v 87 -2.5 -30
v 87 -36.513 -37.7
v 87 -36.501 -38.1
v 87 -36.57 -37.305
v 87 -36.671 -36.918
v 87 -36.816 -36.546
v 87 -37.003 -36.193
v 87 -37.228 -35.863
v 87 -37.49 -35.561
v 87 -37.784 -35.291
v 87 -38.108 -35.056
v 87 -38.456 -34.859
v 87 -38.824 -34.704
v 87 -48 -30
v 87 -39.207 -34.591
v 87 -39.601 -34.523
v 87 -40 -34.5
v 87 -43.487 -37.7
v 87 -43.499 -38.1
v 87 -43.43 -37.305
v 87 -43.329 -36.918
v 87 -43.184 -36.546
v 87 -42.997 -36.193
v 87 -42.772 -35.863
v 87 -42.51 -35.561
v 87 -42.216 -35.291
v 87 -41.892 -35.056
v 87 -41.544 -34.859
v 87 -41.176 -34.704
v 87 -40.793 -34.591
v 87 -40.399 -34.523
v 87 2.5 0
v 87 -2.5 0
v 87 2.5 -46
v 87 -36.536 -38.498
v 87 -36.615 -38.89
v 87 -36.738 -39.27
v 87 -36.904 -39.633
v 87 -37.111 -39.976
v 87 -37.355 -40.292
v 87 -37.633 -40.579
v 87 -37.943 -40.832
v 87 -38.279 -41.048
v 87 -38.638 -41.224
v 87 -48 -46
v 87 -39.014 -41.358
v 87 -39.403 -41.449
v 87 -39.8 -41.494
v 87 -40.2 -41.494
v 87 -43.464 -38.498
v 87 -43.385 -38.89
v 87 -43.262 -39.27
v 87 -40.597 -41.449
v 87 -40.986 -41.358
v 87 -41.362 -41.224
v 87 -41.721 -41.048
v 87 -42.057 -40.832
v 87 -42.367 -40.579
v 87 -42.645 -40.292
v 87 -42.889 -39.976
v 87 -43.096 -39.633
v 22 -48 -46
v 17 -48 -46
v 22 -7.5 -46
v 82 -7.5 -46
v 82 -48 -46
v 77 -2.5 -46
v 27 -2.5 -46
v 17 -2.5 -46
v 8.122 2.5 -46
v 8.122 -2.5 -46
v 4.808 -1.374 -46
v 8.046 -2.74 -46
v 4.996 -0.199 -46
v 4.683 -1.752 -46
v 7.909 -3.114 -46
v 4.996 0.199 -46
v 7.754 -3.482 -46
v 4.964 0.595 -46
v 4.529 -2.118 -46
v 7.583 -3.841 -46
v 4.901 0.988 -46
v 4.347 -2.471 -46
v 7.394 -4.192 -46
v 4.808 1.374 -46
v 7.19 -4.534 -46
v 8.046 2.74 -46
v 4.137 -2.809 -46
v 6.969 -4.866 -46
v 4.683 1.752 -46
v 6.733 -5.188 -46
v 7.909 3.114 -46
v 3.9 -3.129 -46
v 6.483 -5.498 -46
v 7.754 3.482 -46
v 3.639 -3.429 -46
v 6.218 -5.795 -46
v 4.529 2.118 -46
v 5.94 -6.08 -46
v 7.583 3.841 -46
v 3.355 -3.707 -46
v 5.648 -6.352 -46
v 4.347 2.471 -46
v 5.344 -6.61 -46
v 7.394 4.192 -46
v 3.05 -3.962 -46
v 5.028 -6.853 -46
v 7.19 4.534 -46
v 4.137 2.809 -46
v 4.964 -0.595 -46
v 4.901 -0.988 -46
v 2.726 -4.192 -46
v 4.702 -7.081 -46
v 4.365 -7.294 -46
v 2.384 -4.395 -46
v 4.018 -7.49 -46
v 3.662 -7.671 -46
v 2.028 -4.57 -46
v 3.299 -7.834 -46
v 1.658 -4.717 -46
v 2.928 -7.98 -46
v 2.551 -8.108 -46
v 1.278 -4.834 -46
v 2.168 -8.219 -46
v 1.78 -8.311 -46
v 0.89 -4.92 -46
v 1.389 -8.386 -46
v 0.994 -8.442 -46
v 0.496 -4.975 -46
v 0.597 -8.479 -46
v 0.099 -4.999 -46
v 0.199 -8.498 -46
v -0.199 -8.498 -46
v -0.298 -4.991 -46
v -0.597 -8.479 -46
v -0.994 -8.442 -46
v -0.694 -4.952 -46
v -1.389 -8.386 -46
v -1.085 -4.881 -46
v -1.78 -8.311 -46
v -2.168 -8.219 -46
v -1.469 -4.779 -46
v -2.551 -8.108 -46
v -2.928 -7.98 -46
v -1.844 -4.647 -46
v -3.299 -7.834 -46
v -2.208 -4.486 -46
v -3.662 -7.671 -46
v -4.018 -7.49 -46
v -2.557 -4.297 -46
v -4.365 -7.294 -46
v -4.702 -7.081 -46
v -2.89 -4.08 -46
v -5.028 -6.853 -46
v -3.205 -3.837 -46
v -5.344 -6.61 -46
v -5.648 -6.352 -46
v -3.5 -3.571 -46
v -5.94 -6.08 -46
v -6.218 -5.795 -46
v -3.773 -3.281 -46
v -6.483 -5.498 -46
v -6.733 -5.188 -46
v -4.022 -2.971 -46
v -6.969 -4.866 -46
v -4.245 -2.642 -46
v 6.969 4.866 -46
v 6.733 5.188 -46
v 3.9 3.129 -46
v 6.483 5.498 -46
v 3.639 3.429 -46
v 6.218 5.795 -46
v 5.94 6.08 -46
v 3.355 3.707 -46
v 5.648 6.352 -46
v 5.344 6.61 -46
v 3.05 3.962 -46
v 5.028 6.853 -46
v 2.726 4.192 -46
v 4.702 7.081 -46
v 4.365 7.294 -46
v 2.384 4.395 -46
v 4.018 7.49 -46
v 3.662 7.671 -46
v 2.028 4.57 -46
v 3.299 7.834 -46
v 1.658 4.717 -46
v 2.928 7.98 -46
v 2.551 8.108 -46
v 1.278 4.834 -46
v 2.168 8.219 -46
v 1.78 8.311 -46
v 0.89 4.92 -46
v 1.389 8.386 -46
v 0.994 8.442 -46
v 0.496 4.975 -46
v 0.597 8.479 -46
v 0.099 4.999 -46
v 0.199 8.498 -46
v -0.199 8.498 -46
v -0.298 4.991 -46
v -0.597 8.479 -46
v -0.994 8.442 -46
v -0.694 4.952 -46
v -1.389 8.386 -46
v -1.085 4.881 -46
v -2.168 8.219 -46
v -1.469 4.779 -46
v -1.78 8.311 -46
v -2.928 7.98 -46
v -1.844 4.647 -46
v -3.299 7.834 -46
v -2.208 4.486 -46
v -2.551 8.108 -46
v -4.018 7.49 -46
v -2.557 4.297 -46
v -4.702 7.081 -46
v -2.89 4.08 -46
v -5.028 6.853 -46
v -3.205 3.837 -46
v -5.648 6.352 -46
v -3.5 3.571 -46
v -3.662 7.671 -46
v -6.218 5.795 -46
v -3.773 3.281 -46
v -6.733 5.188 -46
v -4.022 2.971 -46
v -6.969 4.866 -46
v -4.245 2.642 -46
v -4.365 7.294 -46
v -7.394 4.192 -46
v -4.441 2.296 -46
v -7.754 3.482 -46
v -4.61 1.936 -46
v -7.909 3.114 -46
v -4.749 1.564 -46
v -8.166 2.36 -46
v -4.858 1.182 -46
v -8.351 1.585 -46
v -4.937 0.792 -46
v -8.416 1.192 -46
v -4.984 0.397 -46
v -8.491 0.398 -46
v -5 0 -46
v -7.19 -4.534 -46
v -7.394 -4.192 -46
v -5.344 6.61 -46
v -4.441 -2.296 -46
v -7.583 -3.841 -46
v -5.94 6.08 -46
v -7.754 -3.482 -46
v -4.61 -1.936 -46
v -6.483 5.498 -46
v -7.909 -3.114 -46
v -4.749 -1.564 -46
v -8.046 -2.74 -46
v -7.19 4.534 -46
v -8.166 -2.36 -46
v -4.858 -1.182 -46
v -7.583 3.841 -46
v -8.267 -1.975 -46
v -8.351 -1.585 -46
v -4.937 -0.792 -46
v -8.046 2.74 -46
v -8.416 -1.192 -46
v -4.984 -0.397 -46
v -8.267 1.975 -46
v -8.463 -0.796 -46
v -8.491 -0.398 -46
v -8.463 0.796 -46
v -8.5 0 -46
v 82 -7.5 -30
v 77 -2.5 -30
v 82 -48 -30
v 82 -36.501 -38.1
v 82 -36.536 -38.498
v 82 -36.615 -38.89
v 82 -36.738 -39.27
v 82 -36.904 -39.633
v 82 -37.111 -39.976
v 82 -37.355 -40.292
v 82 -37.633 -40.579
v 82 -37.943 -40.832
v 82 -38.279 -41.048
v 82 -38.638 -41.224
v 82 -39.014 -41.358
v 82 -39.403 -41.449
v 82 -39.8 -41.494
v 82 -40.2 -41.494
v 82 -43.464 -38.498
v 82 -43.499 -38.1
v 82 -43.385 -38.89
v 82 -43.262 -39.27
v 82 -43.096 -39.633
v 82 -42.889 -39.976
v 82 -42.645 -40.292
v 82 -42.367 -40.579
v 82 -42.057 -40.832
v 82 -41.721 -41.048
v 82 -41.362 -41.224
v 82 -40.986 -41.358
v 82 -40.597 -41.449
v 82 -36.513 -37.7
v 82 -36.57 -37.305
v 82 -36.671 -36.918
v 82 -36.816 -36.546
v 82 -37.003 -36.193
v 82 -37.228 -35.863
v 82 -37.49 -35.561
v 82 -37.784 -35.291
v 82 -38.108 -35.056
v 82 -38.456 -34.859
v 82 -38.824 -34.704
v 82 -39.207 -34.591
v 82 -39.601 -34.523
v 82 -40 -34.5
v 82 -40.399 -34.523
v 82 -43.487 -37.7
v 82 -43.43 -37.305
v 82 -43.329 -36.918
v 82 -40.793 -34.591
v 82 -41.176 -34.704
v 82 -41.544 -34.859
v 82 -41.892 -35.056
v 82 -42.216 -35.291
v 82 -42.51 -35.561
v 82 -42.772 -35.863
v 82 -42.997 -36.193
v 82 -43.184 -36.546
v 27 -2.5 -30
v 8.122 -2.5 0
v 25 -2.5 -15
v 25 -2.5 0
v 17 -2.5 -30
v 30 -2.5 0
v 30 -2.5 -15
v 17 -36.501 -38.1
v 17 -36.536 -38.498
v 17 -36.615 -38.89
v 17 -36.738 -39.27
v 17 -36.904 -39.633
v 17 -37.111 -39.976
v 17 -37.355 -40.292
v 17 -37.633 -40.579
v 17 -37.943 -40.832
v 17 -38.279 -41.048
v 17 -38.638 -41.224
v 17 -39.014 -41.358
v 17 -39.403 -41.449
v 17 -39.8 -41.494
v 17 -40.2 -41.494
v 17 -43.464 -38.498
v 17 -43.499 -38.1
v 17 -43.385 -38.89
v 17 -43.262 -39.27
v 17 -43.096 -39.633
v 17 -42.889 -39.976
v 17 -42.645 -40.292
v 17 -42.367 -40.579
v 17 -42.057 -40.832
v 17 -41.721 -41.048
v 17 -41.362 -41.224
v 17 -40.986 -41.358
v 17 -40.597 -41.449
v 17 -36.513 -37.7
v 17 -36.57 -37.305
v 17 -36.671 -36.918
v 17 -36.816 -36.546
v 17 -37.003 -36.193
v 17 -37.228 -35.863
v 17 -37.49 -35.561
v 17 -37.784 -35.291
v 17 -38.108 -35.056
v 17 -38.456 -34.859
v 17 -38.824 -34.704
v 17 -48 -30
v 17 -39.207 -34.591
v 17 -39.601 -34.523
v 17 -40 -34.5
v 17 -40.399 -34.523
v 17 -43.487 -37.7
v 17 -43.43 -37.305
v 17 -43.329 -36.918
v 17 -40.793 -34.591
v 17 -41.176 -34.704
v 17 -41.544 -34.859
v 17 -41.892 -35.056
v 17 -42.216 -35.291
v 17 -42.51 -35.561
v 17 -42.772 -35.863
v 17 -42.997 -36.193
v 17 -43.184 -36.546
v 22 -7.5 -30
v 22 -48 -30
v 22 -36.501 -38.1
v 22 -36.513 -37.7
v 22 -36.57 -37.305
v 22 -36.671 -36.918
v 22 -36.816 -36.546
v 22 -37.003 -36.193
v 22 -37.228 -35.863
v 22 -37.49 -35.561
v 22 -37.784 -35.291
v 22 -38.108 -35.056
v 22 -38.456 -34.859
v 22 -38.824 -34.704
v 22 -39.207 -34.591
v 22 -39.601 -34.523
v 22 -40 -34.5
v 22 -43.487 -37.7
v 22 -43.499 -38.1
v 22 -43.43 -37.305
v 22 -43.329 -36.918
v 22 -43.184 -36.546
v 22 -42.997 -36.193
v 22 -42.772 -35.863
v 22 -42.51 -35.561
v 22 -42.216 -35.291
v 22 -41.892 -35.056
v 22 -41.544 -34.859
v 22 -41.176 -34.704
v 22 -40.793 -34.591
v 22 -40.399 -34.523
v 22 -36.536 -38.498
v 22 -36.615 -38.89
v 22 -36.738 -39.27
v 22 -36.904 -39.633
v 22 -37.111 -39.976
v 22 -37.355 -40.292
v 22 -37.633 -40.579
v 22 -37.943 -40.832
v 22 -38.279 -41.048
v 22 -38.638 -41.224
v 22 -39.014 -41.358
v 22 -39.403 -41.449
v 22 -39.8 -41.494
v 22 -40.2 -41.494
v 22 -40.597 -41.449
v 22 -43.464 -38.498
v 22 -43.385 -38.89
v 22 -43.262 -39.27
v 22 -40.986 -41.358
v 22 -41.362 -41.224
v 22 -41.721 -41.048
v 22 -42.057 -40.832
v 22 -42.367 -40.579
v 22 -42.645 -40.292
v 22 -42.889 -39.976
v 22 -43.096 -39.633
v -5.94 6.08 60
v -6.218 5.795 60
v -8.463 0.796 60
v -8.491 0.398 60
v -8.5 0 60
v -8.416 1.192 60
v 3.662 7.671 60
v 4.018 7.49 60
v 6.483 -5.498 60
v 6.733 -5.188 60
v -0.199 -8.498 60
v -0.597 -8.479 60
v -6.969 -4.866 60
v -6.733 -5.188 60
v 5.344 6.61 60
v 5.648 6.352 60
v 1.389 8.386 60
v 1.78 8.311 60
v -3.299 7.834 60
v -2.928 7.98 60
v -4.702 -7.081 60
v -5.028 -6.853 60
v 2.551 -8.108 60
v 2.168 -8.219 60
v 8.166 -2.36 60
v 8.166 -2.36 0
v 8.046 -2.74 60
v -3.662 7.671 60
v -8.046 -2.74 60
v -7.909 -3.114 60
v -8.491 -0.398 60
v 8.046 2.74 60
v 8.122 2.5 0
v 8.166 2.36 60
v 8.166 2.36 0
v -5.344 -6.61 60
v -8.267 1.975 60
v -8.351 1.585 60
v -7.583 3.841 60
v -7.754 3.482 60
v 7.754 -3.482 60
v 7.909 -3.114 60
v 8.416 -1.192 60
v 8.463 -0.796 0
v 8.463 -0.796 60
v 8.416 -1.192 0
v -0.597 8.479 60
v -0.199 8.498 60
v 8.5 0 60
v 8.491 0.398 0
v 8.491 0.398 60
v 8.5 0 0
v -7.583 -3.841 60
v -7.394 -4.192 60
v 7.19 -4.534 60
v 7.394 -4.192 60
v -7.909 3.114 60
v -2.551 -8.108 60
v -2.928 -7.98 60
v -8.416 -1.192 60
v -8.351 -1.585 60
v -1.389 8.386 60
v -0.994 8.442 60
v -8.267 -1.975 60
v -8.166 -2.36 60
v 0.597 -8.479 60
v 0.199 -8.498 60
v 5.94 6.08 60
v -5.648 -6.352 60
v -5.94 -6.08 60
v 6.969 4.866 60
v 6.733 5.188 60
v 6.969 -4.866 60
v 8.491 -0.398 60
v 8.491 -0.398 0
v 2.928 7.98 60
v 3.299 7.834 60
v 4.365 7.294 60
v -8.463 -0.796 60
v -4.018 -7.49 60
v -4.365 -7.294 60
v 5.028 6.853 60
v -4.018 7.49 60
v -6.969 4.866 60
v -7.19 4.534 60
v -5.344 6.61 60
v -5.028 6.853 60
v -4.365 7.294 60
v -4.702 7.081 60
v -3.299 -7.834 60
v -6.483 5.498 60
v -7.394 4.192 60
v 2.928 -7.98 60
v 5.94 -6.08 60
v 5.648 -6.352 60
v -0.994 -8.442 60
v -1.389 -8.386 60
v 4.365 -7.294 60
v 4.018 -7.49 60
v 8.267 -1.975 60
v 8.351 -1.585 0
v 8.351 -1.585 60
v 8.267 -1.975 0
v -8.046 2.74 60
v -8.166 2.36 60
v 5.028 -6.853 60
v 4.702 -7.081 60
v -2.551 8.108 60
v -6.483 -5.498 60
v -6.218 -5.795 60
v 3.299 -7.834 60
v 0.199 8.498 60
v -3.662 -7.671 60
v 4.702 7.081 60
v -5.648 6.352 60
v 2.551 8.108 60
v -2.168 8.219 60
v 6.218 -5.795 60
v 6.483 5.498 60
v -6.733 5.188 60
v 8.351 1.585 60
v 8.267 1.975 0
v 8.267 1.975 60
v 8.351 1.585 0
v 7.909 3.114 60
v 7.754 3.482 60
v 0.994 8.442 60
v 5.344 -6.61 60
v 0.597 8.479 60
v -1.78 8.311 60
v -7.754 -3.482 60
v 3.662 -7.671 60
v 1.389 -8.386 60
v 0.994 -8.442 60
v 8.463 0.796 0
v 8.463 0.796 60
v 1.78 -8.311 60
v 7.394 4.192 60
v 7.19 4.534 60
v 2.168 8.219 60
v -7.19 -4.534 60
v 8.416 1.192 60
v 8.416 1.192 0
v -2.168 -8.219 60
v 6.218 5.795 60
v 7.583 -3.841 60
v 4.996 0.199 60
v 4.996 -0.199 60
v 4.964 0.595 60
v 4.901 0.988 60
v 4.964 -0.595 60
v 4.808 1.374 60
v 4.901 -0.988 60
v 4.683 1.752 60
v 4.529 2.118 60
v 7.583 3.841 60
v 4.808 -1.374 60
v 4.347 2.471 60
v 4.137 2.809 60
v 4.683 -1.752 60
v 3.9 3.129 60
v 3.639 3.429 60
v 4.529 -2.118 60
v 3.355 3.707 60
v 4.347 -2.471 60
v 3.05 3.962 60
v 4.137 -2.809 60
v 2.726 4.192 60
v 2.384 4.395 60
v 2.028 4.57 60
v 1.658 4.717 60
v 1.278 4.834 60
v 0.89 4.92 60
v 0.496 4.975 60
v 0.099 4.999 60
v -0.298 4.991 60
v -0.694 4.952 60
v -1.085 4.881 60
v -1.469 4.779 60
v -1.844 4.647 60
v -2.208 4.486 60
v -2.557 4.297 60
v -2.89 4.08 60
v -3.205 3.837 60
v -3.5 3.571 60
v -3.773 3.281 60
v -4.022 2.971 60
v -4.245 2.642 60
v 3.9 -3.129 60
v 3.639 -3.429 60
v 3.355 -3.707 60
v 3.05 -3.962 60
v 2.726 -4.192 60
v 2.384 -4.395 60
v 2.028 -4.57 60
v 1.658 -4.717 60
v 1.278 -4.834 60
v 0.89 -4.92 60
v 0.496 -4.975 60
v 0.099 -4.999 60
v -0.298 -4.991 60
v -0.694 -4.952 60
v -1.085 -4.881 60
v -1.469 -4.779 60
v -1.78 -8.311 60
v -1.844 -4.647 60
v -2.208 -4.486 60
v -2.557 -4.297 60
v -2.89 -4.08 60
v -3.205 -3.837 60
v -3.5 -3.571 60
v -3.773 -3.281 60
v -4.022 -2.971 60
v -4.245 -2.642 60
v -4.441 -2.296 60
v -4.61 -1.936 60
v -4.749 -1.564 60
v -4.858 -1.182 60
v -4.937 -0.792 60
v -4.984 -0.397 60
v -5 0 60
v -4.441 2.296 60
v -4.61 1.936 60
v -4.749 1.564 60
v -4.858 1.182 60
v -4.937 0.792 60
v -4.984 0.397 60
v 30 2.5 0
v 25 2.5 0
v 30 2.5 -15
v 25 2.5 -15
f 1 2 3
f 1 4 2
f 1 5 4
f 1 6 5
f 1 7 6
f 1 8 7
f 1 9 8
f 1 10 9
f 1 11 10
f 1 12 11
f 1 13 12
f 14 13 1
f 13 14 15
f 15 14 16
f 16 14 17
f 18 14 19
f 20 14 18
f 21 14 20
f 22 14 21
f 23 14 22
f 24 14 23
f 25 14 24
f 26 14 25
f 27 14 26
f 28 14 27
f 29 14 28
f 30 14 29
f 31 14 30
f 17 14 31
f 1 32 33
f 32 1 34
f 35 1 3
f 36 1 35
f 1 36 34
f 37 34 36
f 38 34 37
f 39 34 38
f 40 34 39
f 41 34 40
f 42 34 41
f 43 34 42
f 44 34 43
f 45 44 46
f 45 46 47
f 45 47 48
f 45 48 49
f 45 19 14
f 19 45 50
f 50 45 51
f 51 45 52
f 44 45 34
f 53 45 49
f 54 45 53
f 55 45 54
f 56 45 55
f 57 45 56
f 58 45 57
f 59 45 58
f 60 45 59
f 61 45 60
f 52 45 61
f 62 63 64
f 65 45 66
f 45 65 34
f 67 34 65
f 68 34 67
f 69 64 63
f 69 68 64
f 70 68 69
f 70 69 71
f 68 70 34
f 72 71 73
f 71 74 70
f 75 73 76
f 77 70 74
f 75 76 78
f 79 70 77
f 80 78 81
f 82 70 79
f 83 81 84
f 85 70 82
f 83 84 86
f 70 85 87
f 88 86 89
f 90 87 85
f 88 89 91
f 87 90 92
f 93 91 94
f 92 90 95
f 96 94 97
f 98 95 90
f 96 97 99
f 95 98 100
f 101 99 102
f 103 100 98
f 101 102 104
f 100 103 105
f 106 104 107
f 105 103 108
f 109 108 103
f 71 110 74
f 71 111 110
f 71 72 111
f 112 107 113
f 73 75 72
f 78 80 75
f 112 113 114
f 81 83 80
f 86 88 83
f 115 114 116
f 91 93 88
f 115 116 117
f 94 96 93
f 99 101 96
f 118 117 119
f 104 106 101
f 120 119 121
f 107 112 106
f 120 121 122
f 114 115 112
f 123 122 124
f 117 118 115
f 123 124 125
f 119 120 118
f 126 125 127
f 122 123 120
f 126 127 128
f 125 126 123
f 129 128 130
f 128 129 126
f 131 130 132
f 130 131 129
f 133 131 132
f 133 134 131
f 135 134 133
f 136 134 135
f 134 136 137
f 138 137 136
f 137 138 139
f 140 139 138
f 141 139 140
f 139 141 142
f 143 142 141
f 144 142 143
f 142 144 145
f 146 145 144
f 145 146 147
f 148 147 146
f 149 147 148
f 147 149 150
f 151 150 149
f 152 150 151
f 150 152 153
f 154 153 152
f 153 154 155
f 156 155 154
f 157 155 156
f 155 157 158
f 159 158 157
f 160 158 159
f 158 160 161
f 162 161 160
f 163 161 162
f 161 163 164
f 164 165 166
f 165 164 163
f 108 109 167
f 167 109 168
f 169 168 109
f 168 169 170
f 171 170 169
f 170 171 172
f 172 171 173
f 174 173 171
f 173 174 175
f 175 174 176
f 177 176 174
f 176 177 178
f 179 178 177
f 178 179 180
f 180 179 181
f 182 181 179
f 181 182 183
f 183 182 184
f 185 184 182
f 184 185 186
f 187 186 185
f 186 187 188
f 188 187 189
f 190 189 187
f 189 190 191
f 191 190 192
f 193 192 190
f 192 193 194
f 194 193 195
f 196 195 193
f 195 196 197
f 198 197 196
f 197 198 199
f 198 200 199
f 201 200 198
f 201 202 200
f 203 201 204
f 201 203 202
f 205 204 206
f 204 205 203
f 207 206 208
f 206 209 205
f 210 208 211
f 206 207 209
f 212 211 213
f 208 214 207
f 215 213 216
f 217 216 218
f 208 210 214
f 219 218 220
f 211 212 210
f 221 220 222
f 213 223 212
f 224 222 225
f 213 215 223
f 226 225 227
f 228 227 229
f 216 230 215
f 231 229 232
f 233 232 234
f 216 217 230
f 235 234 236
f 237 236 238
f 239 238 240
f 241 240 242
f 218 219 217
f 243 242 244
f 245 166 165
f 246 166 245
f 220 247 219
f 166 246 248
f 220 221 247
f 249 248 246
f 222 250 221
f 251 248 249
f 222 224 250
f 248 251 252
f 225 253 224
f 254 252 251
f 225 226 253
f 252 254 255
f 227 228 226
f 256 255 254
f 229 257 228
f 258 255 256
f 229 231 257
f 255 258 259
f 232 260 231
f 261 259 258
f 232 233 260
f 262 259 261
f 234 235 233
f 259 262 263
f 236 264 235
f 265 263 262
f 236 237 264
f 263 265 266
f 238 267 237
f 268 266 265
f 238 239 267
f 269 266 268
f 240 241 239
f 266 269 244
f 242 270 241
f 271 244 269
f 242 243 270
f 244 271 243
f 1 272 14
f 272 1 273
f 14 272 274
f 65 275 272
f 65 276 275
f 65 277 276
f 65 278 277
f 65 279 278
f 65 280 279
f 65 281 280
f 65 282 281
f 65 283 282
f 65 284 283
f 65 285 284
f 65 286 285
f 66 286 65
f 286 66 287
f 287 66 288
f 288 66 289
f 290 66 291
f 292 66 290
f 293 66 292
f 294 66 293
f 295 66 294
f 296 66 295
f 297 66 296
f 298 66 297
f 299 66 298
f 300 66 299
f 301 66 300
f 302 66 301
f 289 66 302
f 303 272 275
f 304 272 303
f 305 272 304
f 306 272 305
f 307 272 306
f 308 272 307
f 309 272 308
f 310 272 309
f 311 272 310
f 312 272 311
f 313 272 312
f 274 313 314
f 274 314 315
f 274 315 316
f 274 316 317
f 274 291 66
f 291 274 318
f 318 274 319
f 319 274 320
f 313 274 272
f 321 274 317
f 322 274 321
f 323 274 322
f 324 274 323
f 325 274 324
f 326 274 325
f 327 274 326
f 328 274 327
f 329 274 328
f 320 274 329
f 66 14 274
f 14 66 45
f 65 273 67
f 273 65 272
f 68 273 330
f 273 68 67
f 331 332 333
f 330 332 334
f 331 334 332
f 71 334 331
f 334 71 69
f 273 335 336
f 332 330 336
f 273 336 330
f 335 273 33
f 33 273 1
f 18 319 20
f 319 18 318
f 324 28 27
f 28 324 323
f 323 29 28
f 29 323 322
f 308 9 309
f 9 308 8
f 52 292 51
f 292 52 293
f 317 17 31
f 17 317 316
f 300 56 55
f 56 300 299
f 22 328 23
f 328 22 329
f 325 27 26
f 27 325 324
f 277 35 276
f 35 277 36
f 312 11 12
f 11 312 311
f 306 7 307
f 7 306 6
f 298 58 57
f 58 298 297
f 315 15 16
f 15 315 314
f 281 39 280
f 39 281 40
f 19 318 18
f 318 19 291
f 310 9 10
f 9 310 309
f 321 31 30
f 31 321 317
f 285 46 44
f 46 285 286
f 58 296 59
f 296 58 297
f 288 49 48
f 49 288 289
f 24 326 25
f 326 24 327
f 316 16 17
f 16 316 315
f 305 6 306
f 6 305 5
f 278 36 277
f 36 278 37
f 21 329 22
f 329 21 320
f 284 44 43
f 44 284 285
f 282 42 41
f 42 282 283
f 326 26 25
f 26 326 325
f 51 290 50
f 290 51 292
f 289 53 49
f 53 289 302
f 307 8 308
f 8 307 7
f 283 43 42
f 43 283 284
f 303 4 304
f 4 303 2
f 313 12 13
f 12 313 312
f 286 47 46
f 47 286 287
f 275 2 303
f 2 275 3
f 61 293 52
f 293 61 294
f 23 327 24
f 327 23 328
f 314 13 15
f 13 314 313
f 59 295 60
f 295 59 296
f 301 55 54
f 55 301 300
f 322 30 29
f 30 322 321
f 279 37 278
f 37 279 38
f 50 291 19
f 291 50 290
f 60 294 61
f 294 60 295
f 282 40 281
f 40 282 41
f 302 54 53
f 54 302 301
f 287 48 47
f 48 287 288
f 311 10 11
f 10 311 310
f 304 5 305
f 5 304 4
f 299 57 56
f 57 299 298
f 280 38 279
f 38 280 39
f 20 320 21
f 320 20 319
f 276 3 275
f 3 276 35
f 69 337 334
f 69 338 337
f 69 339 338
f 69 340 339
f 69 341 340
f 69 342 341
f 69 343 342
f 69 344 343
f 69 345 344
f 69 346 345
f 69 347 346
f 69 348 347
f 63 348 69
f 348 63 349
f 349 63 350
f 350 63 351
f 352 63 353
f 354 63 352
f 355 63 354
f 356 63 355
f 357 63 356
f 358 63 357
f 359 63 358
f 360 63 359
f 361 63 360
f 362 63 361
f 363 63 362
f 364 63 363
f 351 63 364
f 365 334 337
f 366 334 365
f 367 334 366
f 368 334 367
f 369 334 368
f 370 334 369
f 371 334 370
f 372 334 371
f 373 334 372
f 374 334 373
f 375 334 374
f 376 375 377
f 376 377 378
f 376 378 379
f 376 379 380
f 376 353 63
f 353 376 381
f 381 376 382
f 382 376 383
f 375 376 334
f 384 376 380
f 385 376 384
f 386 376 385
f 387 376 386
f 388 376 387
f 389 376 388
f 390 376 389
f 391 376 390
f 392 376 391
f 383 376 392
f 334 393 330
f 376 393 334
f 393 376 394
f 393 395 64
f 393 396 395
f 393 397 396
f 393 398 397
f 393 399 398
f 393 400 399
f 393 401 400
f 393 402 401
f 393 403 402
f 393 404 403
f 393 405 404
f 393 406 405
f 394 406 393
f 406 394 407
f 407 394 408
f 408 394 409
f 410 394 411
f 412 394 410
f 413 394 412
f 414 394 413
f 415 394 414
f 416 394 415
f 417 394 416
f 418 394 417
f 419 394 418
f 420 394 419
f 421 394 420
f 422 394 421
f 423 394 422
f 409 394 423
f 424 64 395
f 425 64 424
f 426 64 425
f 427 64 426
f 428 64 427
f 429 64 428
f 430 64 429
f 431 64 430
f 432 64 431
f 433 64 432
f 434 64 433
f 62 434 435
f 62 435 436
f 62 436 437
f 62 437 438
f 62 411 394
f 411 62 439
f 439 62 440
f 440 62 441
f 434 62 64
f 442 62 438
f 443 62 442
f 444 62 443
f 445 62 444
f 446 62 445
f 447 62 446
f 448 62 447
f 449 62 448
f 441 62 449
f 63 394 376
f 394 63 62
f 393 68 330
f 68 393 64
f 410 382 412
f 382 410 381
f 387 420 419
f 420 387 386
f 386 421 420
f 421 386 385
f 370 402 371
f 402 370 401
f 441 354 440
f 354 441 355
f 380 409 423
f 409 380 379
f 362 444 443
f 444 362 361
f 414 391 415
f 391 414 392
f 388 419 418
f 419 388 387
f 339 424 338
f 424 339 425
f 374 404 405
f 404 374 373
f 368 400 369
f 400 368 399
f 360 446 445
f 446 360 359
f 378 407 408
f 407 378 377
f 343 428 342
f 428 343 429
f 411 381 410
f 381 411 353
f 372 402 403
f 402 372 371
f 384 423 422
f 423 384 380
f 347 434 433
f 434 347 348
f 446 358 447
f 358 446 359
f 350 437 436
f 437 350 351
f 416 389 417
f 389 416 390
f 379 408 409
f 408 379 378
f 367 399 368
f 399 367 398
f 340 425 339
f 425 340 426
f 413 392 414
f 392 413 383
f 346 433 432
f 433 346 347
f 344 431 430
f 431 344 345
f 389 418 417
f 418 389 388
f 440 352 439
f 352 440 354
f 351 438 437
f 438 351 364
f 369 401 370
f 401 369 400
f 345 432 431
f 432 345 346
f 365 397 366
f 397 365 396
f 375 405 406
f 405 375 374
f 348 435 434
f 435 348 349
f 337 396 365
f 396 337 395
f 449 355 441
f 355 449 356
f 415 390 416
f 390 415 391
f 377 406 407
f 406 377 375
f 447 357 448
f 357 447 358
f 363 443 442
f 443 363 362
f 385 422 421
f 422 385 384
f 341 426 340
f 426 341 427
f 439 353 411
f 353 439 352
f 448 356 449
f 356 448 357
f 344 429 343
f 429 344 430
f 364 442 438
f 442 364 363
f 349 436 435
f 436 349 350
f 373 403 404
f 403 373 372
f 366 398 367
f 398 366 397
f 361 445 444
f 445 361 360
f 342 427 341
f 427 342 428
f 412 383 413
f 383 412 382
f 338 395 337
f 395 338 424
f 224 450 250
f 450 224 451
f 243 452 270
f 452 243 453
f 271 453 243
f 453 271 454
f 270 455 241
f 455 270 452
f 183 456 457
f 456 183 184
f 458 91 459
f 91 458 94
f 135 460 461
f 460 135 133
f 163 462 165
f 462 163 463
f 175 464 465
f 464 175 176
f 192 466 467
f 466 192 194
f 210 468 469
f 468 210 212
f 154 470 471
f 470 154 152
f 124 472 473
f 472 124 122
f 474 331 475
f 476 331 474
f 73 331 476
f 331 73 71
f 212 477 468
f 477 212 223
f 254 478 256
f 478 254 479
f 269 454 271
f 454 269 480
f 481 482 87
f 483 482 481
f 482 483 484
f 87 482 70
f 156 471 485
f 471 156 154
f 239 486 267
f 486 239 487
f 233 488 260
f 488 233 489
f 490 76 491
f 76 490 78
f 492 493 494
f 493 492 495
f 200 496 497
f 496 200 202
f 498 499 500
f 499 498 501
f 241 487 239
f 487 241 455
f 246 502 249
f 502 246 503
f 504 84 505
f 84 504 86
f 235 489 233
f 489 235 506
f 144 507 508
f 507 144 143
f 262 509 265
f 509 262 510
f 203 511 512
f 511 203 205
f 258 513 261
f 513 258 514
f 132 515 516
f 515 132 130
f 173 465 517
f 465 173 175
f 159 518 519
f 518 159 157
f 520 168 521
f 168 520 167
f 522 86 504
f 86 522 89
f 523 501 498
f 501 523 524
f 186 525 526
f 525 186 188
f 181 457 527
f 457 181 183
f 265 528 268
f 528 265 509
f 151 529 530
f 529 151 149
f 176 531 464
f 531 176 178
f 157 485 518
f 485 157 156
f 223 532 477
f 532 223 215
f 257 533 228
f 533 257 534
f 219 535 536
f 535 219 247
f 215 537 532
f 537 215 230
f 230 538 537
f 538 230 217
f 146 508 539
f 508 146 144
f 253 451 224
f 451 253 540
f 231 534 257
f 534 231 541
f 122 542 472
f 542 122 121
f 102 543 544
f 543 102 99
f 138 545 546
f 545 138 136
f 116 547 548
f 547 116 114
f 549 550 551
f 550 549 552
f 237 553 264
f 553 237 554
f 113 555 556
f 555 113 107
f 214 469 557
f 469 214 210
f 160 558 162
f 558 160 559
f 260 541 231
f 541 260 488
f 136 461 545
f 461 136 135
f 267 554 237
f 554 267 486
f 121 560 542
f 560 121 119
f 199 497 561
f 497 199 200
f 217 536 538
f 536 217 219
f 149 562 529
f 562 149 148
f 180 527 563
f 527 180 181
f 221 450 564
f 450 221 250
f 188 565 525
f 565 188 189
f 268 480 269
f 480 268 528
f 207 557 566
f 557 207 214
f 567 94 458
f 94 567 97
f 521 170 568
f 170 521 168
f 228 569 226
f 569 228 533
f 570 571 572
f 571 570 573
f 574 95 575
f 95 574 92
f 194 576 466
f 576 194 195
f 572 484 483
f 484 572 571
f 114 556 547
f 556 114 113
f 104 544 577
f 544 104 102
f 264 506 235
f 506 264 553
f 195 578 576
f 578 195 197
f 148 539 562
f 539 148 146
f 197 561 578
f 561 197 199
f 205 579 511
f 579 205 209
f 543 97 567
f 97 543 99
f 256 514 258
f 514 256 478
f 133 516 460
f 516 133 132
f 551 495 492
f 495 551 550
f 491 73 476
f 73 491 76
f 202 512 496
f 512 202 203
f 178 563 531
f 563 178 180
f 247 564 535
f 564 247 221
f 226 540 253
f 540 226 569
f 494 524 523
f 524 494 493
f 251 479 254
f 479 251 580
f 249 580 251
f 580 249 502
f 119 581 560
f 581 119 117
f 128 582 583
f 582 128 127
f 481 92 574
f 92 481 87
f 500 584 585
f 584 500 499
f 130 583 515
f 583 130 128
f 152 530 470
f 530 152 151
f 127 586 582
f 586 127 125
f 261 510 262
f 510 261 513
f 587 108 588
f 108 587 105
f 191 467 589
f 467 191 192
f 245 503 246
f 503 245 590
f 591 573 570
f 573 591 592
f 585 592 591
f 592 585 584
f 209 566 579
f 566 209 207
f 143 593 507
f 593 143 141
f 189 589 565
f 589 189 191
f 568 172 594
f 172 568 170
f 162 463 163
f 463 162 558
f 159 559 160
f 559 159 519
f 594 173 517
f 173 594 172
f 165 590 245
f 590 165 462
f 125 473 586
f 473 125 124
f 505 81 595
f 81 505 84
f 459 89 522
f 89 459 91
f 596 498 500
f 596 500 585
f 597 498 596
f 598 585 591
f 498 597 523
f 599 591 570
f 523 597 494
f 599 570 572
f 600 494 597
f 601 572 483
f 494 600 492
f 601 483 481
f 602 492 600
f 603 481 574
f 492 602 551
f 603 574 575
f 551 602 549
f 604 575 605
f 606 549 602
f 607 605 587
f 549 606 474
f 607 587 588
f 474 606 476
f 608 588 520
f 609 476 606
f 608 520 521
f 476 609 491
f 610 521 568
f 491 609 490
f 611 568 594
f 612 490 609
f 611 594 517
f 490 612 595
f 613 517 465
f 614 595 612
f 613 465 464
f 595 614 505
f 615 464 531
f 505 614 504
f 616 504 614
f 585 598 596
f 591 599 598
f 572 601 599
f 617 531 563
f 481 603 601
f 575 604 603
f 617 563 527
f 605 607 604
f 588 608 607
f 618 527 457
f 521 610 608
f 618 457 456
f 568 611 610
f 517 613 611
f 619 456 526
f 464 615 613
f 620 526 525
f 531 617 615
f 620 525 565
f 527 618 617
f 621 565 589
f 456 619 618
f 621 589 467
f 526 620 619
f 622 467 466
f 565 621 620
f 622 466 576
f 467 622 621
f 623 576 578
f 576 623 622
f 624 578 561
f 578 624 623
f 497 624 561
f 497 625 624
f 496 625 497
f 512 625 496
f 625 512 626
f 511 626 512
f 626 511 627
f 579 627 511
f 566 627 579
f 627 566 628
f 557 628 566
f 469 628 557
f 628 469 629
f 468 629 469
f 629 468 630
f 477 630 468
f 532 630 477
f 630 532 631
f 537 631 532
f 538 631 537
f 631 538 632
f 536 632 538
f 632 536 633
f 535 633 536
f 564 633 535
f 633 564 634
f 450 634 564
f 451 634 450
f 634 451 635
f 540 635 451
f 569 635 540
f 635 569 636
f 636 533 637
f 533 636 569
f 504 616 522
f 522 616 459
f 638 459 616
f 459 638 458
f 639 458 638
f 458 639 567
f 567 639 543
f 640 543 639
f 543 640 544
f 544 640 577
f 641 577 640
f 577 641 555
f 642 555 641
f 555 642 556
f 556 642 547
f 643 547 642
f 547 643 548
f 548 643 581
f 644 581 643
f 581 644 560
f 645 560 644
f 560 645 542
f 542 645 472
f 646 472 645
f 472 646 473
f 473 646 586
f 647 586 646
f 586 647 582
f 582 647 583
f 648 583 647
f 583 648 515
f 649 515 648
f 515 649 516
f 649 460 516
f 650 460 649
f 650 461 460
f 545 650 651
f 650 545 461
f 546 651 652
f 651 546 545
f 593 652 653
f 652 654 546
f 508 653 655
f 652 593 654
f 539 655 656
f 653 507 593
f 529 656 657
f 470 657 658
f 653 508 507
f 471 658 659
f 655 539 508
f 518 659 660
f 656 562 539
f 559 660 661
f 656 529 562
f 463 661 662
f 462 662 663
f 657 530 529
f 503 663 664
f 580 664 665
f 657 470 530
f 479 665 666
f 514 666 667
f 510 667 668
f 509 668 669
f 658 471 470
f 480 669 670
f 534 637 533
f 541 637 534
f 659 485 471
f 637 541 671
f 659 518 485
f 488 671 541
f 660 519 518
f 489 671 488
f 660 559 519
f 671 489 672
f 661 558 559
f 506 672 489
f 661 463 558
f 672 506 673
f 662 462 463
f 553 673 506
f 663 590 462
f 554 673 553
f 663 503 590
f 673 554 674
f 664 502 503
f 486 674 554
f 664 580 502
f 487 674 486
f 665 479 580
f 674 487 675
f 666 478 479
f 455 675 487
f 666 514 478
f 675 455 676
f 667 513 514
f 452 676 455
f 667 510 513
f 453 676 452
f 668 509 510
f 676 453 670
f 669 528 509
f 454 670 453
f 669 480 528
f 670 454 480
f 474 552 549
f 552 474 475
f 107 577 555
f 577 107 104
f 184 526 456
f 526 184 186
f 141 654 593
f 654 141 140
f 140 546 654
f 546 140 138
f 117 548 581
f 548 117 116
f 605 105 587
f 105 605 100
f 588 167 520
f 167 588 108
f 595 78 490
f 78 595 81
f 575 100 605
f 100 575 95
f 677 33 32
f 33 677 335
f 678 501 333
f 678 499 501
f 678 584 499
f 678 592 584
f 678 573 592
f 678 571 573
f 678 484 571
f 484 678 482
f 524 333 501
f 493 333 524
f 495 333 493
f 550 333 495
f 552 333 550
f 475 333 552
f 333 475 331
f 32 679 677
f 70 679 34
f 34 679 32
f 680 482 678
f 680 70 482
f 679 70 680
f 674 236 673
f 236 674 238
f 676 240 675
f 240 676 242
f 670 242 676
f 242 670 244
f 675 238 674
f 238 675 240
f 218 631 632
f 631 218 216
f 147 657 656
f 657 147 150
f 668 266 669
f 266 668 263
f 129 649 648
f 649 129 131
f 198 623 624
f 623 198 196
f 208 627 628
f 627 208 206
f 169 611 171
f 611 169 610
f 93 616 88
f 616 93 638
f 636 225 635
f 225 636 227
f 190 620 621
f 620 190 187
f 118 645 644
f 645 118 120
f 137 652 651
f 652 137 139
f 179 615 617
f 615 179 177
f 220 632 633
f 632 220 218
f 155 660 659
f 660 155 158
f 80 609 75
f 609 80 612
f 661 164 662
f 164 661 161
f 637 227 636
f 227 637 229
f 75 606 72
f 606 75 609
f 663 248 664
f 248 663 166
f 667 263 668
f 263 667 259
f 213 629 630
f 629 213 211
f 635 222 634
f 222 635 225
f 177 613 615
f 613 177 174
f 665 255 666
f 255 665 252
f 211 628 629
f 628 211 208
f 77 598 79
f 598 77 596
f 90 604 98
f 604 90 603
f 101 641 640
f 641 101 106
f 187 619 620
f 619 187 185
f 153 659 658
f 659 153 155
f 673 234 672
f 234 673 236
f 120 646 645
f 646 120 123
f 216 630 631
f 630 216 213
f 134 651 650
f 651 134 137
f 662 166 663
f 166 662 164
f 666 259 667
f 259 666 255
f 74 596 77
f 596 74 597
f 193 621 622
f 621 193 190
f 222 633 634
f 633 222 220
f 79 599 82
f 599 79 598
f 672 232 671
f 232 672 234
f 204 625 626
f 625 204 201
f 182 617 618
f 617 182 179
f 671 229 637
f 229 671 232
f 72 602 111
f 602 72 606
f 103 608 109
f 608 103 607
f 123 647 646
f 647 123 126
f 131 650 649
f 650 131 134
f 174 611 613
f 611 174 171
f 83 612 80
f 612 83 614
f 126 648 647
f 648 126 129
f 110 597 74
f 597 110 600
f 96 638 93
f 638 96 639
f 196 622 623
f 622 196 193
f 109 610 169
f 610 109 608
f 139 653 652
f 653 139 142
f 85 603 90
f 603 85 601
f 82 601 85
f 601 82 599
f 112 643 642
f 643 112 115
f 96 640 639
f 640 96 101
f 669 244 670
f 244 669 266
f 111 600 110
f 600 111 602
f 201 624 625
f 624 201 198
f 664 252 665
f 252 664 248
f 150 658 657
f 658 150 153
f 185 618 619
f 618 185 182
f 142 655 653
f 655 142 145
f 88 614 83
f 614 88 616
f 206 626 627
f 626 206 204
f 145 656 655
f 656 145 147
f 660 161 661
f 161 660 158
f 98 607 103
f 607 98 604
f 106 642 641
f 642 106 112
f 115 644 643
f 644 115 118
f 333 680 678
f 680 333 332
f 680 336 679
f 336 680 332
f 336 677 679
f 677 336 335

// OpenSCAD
// file: ../lib/lib.scad
function sel(v, indices) = [ for (i = indices) v[i] ];
function eps() = 0.01;

module cmirror(v = [1, 0, 0])
{
	children();
	mirror(v)
		children();
}
// file: wall.scad
module wall()
{
	difference()
	{
		translate([-30, -20, -10])
		cube([5, 40, 25 + 10]);

		translate([-5 - 30, -26 / 2, -30])
		cube([15, 26, 30]);

		translate([-5 - 30, -5 / 2, 15])
		cube([15, 5, 30]);
	}
}
// file: microscope.scad
use <../lib/lib.scad>

function microscopeWidth() = 60;
function microscopeDepth() = 60;
function microscopeHeight() = 55;

function microscopeMountingHoleD() = 6;

module microscope()
{
	translate([-microscopeWidth() / 2, 0, 0])
	union()
	{
		difference()
		{
			translate([-microscopeWidth() / 2, -microscopeDepth() / 2, -4])
			cube([microscopeWidth(), microscopeDepth(), microscopeHeight()]);

			cmirror()
			translate([microscopeWidth() / 2 - 5, 0, 0])
			rotate([0, 90, 0])
			cylinder(h = 10.0, d = microscopeMountingHoleD());
		}

		rotate([180, 0, 0])
		cylinder(h = 100.0, d = 40);
	}
}
// file: hw-conn-microscope.scad
use <../lib/lib.scad>
use <microscope.scad>

// x .. Width
// y .. Depth
// z .. Height

function refPtX() = -22;
function refPtY() = -40;
function refPtZ() = 38;

function forkHeight() = 16;
forkWidth = 5;
forkDepth = abs(refPtY()) + forkHeight() / 2;

module hwConnMicoscope()
{
	difference()
	{
		union()
		{
		translate([0, 0, -60])
		cylinder(h = refPtZ() + forkHeight() / 2 + 60, d = 17);

		// fork
		translate
		([
			refPtX(),
			refPtY() + forkDepth - forkHeight() / 2,
			refPtZ()
		])
		translate([-microscopeWidth() / 2, 0, 0])
		cmirror()
		translate([-microscopeWidth() / 2, 0, -forkHeight() / 2])
		rotate([0, 0, 180])
		difference()
		{
			union()
			{
				cube([forkWidth, forkDepth, forkHeight()]);

				translate([0, 2.5, 0])
				rotate([0, 0, 90])
				linear_extrude(forkHeight())
				polygon([[0, 0], [5, 0], [0, 5]]);
			}

			translate([-forkWidth, forkDepth - forkHeight() / 2, forkHeight() / 2])
			rotate([0, 90, 0])
			cylinder(h = 3 * forkWidth, d = 7);
		}

		// bridge
		rotate([0, 0, 180])
		translate([0, -2.5, 0])
		cube
		([
			abs(refPtX()) + microscopeWidth() + forkWidth,
			5,
			refPtZ() + forkHeight() / 2
		]);
		}

		translate([0, 0, -70])
		cylinder(h = refPtZ() + forkHeight() / 2 + 80, d = 10);

		translate([-30, -10, 0])
		cube([5, 20, 15]);
	}
}
// file: ../lib/hw-conn-cam.scad
$fa = 1.0;
$fs = 0.4;

module hwConnCam()
{
	rotate([180, 0, 180])
	union()
	{
	difference()
	{
		union()
		{
			cylinder(h = 60.0, d = 23.5);
			cylinder(h = 5.0, d = 40);

			// top
			translate([0, -13, 0])
				cube([70, 26, 5]);
		}

		translate([0, 0, -0.1])
			cylinder(h = 60.2, d = 17);
	}

	// plate
	translate([40, 6, 0.0])
	{
		difference()
		{
			cube([30, 7, 40]);
			translate([15, 10, 28])
				rotate([90, 0, 0])
					cylinder(h = 15.0, d = 7);
		}
	}

	c = [
		[ 0, 0],
		[10, 0],
		[0, 10],
	];


	translate([40, 8, 5])
	rotate([180, 0, 0])
	rotate([0, 90, 0])
	linear_extrude(30)
		polygon(c);
	}
}
// main file
$fa = 1.0;
$fs = 0.4;

use <../lib/hw-conn-cam.scad>
use <hw-conn-microscope.scad>
use <microscope.scad>
use <wall.scad>

hwConnCamShow = false;
hwConnMicroscopeShow = true;
wallShow = false;
microscopeShow = false;

if (hwConnMicroscopeShow)
{
	rotate([0, 180, 0])
	hwConnMicoscope();
}

if (wallShow)
	wall();

if (hwConnCamShow)
{
	color([0.2, 0.5, 0.0, 0.4])
	hwConnCam();
}

if (microscopeShow)
{
	color([0.2, 0.5, 0.0, 0.4])
	translate([refPtX(), refPtY(), refPtZ()])
		microscope();
}
